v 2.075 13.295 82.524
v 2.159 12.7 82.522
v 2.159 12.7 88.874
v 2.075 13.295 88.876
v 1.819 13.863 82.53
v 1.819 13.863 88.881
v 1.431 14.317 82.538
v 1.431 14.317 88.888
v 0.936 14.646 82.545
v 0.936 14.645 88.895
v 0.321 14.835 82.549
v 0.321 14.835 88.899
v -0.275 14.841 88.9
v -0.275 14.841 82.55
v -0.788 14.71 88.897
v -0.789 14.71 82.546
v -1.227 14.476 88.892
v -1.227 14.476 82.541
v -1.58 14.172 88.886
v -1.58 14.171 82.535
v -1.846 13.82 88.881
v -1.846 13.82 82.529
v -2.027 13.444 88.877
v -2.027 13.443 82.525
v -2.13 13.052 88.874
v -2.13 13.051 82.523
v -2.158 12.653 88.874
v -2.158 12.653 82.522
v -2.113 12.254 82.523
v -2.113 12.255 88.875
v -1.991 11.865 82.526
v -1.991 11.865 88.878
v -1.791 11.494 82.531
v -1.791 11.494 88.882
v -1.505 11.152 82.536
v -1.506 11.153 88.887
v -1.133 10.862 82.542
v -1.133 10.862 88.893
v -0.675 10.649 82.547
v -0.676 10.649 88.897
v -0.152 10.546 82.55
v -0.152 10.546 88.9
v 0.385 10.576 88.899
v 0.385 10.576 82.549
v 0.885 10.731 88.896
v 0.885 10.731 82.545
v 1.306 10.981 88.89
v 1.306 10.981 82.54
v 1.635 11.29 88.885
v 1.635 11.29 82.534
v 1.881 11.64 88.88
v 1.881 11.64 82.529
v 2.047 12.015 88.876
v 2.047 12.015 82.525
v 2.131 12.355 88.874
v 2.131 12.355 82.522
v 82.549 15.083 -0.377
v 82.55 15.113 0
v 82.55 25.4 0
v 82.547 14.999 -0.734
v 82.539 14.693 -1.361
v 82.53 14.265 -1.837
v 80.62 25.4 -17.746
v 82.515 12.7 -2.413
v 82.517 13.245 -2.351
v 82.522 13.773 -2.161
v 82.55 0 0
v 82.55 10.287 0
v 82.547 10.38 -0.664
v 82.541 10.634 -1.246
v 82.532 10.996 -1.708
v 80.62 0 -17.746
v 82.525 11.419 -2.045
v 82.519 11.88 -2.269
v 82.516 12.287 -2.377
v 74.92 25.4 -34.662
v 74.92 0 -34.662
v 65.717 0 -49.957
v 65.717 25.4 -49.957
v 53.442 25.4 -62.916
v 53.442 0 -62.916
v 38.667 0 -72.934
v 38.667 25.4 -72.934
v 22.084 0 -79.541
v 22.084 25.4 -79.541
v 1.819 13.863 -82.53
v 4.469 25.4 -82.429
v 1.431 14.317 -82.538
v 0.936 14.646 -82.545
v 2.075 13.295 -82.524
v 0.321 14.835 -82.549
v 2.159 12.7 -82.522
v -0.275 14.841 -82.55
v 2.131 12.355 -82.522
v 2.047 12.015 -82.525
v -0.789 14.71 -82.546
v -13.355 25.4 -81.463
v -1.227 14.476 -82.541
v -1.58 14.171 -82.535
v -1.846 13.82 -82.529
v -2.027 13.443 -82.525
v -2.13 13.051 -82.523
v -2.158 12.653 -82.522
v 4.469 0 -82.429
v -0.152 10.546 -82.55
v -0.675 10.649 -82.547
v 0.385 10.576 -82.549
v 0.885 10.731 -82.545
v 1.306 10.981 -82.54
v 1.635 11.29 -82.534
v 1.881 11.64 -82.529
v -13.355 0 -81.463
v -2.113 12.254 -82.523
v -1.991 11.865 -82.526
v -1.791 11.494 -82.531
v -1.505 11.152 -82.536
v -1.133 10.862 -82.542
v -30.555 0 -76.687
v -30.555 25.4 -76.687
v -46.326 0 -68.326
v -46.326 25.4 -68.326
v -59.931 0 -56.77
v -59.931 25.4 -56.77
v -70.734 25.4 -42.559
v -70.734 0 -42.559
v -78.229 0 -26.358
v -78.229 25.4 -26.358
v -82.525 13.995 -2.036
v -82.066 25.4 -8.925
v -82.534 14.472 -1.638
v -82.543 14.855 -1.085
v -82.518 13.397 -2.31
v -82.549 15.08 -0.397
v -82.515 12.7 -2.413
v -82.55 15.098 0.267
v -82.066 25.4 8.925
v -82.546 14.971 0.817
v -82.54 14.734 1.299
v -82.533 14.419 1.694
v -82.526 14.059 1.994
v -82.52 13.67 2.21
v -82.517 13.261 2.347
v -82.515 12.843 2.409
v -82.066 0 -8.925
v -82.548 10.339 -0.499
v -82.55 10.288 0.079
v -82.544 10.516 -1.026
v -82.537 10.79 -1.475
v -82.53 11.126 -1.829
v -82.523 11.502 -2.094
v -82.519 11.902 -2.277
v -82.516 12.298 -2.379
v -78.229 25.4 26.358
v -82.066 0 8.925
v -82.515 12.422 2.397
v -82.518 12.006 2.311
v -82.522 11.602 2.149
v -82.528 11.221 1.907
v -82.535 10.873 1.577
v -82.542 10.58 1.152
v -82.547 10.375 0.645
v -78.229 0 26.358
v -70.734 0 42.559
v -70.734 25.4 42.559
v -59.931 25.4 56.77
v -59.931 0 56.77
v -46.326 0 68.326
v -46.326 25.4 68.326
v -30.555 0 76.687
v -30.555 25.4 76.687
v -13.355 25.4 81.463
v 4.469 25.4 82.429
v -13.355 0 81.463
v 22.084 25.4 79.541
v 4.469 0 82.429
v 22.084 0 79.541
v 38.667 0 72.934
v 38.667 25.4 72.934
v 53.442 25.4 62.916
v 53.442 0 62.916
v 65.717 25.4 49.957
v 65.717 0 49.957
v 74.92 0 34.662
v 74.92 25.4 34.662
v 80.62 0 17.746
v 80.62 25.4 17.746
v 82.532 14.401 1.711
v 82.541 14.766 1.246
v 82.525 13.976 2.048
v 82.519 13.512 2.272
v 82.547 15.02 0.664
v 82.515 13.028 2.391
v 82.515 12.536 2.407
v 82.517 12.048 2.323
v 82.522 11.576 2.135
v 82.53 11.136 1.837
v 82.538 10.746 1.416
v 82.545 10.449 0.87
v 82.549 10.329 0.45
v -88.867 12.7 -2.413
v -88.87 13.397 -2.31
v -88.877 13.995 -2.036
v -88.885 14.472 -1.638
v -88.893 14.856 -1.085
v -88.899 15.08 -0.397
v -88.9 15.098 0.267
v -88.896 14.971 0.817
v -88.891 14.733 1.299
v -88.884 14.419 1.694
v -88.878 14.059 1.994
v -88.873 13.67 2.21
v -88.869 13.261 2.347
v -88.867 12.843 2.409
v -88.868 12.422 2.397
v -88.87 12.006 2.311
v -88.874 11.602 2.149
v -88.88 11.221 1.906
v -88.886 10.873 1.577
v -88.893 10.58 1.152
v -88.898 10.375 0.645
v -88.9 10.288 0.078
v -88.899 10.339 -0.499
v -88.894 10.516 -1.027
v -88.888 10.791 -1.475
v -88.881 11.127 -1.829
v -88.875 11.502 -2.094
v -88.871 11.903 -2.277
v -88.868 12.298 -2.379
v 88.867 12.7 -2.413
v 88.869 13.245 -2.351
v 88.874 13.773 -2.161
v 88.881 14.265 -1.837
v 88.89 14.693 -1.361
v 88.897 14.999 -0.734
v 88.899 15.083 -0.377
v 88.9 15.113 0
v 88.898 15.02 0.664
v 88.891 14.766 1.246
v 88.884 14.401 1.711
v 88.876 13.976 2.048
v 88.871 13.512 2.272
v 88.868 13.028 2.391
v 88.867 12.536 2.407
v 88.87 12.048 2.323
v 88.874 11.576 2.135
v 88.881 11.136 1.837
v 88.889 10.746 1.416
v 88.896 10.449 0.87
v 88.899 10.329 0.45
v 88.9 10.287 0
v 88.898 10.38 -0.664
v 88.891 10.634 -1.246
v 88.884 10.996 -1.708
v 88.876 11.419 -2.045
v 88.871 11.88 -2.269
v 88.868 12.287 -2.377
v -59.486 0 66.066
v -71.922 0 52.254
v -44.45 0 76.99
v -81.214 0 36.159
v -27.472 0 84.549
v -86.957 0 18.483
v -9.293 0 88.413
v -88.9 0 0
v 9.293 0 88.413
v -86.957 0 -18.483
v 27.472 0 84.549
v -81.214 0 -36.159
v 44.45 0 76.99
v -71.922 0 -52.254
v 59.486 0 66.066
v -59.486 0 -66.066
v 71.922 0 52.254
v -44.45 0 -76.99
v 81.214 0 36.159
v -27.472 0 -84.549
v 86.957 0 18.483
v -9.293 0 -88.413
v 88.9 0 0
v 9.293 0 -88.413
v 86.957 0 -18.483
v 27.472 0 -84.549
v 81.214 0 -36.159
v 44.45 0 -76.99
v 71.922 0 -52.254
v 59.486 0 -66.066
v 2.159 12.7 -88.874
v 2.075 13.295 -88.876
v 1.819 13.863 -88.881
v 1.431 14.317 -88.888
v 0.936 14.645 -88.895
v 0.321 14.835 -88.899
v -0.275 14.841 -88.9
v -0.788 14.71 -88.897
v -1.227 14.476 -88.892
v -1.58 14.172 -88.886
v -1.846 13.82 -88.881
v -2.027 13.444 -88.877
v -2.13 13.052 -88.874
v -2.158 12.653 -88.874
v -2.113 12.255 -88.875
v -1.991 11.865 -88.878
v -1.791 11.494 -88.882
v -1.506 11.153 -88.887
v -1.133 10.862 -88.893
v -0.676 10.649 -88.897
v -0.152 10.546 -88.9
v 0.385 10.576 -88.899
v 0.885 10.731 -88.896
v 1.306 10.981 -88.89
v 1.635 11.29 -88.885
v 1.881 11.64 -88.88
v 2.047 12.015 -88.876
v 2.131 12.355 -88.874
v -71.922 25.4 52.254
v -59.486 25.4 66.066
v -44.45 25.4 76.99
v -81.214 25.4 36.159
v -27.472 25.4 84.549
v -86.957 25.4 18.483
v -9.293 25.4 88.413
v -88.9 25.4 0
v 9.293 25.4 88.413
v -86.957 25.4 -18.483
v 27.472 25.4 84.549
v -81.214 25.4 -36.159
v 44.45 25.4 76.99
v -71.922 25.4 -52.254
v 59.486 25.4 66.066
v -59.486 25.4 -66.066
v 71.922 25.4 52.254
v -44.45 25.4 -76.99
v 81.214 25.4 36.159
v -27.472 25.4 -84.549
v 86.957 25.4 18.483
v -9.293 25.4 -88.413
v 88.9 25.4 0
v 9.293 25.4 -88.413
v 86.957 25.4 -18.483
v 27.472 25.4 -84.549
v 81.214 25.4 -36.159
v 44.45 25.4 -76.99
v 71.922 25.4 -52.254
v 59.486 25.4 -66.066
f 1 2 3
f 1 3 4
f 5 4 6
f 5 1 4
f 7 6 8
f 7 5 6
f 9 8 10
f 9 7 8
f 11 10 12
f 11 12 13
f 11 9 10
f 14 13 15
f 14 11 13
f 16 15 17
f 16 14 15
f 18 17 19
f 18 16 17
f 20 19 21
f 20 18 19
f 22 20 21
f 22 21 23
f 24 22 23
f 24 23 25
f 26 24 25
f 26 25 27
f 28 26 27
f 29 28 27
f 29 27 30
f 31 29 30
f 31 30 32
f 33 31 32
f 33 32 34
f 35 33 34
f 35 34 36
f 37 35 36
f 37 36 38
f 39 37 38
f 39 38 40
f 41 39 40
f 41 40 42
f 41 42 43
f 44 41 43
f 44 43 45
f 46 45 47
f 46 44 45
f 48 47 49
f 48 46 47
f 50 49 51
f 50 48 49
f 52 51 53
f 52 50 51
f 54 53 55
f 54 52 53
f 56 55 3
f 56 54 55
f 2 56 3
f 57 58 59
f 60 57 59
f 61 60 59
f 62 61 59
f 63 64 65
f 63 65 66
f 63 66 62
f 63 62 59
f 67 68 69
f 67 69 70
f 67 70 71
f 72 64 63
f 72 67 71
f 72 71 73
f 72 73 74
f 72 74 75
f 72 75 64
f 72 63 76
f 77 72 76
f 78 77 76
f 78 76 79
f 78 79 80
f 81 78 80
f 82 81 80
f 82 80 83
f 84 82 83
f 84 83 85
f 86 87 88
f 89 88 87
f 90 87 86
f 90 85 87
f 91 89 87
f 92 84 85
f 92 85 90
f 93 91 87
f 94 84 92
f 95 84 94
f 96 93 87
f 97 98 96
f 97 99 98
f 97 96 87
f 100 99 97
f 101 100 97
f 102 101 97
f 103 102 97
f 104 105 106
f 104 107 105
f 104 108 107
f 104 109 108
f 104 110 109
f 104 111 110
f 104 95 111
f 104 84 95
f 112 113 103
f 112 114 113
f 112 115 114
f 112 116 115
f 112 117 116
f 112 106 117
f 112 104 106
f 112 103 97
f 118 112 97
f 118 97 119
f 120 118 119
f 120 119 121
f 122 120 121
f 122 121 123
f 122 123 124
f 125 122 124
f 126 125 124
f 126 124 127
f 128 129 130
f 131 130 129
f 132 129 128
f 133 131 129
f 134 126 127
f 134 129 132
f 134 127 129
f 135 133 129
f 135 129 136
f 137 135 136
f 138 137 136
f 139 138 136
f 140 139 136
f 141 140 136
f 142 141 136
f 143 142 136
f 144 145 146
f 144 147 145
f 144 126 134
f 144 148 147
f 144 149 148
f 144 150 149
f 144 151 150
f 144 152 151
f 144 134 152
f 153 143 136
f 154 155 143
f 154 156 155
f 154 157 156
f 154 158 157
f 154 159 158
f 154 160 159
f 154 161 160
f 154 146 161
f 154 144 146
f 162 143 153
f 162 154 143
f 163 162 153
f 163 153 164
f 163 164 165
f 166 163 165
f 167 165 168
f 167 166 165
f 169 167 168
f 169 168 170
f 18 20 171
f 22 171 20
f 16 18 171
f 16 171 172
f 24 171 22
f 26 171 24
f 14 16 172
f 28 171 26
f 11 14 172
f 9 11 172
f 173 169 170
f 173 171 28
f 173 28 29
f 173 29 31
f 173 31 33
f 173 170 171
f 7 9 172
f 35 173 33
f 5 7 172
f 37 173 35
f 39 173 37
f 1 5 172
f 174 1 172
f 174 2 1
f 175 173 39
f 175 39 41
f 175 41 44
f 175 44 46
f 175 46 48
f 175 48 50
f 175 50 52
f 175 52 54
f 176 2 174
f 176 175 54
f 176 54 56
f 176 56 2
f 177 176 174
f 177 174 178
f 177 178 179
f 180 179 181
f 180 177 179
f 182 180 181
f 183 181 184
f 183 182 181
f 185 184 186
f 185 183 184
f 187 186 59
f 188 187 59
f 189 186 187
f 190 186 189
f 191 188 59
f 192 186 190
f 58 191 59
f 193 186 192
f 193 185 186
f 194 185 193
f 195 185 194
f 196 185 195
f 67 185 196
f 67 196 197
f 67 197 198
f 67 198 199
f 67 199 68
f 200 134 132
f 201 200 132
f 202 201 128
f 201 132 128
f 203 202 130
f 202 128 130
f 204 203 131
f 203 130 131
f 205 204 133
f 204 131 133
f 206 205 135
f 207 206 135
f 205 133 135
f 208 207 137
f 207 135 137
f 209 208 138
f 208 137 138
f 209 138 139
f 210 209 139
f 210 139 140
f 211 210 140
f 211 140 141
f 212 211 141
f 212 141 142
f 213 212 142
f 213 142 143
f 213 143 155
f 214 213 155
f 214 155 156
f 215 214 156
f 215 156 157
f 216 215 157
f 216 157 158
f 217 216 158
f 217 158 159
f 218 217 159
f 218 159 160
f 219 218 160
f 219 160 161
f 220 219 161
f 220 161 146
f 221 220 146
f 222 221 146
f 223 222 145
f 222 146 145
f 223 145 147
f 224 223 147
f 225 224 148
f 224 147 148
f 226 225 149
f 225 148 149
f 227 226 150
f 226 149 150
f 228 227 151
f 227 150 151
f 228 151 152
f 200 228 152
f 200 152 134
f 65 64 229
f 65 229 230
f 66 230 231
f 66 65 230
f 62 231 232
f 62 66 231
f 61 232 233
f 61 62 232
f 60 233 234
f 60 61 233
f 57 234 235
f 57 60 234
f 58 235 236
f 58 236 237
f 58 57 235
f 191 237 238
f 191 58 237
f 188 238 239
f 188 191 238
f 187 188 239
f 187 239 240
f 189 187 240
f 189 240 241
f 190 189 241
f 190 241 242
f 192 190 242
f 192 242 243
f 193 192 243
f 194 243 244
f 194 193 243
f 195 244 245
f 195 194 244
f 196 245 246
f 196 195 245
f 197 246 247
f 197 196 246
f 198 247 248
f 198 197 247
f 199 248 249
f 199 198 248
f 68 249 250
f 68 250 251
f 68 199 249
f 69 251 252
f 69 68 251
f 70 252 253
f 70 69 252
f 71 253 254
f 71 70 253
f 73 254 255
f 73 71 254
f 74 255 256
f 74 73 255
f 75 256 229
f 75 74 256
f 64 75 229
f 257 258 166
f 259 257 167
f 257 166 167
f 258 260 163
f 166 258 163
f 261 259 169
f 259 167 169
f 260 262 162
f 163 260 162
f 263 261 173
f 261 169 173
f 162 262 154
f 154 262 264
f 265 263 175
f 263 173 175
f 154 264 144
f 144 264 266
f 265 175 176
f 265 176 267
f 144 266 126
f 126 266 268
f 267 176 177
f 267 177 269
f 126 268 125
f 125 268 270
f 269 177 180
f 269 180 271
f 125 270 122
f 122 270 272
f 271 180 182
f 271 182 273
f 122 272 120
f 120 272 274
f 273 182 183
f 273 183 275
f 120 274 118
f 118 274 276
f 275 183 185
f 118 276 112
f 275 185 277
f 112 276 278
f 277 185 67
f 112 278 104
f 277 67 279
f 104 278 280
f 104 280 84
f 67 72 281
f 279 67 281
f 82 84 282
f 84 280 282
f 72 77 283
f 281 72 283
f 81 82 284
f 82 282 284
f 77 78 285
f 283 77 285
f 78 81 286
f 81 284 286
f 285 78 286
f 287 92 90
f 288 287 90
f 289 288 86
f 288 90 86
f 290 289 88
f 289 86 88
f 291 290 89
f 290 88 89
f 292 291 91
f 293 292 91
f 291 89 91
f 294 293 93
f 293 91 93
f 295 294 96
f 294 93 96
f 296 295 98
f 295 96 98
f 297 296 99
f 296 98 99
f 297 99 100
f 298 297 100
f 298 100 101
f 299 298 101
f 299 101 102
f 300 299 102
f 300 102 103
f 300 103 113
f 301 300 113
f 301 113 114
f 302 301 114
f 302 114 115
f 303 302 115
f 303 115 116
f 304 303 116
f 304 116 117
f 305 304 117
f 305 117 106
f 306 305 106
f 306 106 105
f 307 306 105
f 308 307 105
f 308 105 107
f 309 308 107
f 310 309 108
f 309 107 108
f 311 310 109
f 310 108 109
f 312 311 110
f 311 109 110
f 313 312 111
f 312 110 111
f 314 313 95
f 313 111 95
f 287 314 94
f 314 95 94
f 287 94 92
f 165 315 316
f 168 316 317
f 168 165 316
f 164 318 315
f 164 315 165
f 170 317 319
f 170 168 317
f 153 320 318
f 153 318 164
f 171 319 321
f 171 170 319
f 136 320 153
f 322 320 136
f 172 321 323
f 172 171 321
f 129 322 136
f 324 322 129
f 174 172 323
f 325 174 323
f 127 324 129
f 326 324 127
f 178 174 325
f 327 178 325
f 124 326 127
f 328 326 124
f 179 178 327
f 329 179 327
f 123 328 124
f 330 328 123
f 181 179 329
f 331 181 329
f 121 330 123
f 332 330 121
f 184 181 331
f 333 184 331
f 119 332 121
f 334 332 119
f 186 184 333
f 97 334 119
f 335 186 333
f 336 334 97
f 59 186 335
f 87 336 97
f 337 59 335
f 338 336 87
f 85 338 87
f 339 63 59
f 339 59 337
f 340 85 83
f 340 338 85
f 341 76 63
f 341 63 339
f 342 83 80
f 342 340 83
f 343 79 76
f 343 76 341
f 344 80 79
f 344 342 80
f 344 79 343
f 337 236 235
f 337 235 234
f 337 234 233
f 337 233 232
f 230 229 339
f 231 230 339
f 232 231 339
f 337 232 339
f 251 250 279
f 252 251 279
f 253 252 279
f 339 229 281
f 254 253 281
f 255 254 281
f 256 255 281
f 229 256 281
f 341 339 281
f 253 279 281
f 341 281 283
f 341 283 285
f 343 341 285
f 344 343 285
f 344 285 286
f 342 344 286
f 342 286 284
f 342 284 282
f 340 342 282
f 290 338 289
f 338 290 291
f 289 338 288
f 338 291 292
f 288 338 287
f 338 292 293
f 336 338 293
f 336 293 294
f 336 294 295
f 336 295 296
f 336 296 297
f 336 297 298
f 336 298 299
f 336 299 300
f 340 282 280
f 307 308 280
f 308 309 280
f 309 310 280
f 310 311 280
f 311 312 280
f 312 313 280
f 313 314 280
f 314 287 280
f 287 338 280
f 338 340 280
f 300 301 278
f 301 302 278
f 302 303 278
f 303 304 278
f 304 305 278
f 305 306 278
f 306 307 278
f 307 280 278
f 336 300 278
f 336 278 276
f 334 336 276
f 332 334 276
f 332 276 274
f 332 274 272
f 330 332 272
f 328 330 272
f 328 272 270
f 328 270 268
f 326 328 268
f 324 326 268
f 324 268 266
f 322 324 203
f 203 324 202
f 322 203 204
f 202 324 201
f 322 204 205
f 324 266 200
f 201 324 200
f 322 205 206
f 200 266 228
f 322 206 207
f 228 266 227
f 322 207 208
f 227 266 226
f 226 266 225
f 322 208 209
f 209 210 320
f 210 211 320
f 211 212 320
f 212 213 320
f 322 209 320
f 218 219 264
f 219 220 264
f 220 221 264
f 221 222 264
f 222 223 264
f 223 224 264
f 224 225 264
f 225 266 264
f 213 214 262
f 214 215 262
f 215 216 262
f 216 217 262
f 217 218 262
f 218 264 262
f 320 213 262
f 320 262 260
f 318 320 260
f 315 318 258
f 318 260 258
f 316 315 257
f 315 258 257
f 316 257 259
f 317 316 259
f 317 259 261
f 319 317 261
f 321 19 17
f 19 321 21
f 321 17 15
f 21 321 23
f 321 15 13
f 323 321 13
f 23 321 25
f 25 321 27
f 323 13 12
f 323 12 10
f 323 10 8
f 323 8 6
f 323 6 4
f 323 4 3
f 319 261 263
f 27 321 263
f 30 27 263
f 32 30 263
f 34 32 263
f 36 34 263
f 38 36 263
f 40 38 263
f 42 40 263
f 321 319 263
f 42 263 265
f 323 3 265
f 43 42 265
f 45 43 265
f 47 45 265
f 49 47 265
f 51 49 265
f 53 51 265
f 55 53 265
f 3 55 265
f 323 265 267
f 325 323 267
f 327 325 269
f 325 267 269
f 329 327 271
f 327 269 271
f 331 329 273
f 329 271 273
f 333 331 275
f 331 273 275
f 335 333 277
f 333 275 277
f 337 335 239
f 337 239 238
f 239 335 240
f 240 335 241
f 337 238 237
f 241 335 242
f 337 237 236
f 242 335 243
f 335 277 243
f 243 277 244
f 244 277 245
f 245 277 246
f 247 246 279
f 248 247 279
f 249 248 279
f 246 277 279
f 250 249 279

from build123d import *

# Parameters (mm, degrees)
SKETCH1_R               = 88.9
SKETCH1_R_2             = 82.55
BOSS_EXTRUDE1_DEPTH     = 25.4
SKETCH2_R               = 2.413
CUT_EXTRUDE1_DEPTH      = 89.9
CUT_EXTRUDE1_DEPTH_BACK = 89.9
SKETCH3_R               = 2.159
CUT_EXTRUDE2_DEPTH      = 89.9000001
CUT_EXTRUDE2_DEPTH_BACK = 89.9000001


with BuildPart() as part:
    # Sketch1 → Boss-Extrude1 (new body)
    with BuildSketch(Plane(origin=(0, 0, 0), x_dir=(1, 0, 0), z_dir=(0, 1, 0))):
        Circle(SKETCH1_R)
        Circle(SKETCH1_R_2, mode=Mode.SUBTRACT)
    extrude(amount=BOSS_EXTRUDE1_DEPTH)

    # Sketch2 → Cut-Extrude1 (cut, two sides)
    with BuildSketch(Plane(origin=(0, 0, 0), x_dir=(0, 0, -1), z_dir=(1, 0, 0))) as cut_extrude1_sk:
        with Locations((0, 12.7)):
            Circle(SKETCH2_R)
    extrude(amount=CUT_EXTRUDE1_DEPTH, mode=Mode.SUBTRACT)
    extrude(cut_extrude1_sk.sketch, amount=-CUT_EXTRUDE1_DEPTH_BACK, mode=Mode.SUBTRACT)

    # Sketch3 → Cut-Extrude2 (cut, two sides)
    with BuildSketch(Plane.XY) as cut_extrude2_sk:
        with Locations((0, 12.7)):
            Circle(SKETCH3_R)
    extrude(amount=CUT_EXTRUDE2_DEPTH, mode=Mode.SUBTRACT)
    extrude(cut_extrude2_sk.sketch, amount=-CUT_EXTRUDE2_DEPTH_BACK, mode=Mode.SUBTRACT)


solid = part.part
